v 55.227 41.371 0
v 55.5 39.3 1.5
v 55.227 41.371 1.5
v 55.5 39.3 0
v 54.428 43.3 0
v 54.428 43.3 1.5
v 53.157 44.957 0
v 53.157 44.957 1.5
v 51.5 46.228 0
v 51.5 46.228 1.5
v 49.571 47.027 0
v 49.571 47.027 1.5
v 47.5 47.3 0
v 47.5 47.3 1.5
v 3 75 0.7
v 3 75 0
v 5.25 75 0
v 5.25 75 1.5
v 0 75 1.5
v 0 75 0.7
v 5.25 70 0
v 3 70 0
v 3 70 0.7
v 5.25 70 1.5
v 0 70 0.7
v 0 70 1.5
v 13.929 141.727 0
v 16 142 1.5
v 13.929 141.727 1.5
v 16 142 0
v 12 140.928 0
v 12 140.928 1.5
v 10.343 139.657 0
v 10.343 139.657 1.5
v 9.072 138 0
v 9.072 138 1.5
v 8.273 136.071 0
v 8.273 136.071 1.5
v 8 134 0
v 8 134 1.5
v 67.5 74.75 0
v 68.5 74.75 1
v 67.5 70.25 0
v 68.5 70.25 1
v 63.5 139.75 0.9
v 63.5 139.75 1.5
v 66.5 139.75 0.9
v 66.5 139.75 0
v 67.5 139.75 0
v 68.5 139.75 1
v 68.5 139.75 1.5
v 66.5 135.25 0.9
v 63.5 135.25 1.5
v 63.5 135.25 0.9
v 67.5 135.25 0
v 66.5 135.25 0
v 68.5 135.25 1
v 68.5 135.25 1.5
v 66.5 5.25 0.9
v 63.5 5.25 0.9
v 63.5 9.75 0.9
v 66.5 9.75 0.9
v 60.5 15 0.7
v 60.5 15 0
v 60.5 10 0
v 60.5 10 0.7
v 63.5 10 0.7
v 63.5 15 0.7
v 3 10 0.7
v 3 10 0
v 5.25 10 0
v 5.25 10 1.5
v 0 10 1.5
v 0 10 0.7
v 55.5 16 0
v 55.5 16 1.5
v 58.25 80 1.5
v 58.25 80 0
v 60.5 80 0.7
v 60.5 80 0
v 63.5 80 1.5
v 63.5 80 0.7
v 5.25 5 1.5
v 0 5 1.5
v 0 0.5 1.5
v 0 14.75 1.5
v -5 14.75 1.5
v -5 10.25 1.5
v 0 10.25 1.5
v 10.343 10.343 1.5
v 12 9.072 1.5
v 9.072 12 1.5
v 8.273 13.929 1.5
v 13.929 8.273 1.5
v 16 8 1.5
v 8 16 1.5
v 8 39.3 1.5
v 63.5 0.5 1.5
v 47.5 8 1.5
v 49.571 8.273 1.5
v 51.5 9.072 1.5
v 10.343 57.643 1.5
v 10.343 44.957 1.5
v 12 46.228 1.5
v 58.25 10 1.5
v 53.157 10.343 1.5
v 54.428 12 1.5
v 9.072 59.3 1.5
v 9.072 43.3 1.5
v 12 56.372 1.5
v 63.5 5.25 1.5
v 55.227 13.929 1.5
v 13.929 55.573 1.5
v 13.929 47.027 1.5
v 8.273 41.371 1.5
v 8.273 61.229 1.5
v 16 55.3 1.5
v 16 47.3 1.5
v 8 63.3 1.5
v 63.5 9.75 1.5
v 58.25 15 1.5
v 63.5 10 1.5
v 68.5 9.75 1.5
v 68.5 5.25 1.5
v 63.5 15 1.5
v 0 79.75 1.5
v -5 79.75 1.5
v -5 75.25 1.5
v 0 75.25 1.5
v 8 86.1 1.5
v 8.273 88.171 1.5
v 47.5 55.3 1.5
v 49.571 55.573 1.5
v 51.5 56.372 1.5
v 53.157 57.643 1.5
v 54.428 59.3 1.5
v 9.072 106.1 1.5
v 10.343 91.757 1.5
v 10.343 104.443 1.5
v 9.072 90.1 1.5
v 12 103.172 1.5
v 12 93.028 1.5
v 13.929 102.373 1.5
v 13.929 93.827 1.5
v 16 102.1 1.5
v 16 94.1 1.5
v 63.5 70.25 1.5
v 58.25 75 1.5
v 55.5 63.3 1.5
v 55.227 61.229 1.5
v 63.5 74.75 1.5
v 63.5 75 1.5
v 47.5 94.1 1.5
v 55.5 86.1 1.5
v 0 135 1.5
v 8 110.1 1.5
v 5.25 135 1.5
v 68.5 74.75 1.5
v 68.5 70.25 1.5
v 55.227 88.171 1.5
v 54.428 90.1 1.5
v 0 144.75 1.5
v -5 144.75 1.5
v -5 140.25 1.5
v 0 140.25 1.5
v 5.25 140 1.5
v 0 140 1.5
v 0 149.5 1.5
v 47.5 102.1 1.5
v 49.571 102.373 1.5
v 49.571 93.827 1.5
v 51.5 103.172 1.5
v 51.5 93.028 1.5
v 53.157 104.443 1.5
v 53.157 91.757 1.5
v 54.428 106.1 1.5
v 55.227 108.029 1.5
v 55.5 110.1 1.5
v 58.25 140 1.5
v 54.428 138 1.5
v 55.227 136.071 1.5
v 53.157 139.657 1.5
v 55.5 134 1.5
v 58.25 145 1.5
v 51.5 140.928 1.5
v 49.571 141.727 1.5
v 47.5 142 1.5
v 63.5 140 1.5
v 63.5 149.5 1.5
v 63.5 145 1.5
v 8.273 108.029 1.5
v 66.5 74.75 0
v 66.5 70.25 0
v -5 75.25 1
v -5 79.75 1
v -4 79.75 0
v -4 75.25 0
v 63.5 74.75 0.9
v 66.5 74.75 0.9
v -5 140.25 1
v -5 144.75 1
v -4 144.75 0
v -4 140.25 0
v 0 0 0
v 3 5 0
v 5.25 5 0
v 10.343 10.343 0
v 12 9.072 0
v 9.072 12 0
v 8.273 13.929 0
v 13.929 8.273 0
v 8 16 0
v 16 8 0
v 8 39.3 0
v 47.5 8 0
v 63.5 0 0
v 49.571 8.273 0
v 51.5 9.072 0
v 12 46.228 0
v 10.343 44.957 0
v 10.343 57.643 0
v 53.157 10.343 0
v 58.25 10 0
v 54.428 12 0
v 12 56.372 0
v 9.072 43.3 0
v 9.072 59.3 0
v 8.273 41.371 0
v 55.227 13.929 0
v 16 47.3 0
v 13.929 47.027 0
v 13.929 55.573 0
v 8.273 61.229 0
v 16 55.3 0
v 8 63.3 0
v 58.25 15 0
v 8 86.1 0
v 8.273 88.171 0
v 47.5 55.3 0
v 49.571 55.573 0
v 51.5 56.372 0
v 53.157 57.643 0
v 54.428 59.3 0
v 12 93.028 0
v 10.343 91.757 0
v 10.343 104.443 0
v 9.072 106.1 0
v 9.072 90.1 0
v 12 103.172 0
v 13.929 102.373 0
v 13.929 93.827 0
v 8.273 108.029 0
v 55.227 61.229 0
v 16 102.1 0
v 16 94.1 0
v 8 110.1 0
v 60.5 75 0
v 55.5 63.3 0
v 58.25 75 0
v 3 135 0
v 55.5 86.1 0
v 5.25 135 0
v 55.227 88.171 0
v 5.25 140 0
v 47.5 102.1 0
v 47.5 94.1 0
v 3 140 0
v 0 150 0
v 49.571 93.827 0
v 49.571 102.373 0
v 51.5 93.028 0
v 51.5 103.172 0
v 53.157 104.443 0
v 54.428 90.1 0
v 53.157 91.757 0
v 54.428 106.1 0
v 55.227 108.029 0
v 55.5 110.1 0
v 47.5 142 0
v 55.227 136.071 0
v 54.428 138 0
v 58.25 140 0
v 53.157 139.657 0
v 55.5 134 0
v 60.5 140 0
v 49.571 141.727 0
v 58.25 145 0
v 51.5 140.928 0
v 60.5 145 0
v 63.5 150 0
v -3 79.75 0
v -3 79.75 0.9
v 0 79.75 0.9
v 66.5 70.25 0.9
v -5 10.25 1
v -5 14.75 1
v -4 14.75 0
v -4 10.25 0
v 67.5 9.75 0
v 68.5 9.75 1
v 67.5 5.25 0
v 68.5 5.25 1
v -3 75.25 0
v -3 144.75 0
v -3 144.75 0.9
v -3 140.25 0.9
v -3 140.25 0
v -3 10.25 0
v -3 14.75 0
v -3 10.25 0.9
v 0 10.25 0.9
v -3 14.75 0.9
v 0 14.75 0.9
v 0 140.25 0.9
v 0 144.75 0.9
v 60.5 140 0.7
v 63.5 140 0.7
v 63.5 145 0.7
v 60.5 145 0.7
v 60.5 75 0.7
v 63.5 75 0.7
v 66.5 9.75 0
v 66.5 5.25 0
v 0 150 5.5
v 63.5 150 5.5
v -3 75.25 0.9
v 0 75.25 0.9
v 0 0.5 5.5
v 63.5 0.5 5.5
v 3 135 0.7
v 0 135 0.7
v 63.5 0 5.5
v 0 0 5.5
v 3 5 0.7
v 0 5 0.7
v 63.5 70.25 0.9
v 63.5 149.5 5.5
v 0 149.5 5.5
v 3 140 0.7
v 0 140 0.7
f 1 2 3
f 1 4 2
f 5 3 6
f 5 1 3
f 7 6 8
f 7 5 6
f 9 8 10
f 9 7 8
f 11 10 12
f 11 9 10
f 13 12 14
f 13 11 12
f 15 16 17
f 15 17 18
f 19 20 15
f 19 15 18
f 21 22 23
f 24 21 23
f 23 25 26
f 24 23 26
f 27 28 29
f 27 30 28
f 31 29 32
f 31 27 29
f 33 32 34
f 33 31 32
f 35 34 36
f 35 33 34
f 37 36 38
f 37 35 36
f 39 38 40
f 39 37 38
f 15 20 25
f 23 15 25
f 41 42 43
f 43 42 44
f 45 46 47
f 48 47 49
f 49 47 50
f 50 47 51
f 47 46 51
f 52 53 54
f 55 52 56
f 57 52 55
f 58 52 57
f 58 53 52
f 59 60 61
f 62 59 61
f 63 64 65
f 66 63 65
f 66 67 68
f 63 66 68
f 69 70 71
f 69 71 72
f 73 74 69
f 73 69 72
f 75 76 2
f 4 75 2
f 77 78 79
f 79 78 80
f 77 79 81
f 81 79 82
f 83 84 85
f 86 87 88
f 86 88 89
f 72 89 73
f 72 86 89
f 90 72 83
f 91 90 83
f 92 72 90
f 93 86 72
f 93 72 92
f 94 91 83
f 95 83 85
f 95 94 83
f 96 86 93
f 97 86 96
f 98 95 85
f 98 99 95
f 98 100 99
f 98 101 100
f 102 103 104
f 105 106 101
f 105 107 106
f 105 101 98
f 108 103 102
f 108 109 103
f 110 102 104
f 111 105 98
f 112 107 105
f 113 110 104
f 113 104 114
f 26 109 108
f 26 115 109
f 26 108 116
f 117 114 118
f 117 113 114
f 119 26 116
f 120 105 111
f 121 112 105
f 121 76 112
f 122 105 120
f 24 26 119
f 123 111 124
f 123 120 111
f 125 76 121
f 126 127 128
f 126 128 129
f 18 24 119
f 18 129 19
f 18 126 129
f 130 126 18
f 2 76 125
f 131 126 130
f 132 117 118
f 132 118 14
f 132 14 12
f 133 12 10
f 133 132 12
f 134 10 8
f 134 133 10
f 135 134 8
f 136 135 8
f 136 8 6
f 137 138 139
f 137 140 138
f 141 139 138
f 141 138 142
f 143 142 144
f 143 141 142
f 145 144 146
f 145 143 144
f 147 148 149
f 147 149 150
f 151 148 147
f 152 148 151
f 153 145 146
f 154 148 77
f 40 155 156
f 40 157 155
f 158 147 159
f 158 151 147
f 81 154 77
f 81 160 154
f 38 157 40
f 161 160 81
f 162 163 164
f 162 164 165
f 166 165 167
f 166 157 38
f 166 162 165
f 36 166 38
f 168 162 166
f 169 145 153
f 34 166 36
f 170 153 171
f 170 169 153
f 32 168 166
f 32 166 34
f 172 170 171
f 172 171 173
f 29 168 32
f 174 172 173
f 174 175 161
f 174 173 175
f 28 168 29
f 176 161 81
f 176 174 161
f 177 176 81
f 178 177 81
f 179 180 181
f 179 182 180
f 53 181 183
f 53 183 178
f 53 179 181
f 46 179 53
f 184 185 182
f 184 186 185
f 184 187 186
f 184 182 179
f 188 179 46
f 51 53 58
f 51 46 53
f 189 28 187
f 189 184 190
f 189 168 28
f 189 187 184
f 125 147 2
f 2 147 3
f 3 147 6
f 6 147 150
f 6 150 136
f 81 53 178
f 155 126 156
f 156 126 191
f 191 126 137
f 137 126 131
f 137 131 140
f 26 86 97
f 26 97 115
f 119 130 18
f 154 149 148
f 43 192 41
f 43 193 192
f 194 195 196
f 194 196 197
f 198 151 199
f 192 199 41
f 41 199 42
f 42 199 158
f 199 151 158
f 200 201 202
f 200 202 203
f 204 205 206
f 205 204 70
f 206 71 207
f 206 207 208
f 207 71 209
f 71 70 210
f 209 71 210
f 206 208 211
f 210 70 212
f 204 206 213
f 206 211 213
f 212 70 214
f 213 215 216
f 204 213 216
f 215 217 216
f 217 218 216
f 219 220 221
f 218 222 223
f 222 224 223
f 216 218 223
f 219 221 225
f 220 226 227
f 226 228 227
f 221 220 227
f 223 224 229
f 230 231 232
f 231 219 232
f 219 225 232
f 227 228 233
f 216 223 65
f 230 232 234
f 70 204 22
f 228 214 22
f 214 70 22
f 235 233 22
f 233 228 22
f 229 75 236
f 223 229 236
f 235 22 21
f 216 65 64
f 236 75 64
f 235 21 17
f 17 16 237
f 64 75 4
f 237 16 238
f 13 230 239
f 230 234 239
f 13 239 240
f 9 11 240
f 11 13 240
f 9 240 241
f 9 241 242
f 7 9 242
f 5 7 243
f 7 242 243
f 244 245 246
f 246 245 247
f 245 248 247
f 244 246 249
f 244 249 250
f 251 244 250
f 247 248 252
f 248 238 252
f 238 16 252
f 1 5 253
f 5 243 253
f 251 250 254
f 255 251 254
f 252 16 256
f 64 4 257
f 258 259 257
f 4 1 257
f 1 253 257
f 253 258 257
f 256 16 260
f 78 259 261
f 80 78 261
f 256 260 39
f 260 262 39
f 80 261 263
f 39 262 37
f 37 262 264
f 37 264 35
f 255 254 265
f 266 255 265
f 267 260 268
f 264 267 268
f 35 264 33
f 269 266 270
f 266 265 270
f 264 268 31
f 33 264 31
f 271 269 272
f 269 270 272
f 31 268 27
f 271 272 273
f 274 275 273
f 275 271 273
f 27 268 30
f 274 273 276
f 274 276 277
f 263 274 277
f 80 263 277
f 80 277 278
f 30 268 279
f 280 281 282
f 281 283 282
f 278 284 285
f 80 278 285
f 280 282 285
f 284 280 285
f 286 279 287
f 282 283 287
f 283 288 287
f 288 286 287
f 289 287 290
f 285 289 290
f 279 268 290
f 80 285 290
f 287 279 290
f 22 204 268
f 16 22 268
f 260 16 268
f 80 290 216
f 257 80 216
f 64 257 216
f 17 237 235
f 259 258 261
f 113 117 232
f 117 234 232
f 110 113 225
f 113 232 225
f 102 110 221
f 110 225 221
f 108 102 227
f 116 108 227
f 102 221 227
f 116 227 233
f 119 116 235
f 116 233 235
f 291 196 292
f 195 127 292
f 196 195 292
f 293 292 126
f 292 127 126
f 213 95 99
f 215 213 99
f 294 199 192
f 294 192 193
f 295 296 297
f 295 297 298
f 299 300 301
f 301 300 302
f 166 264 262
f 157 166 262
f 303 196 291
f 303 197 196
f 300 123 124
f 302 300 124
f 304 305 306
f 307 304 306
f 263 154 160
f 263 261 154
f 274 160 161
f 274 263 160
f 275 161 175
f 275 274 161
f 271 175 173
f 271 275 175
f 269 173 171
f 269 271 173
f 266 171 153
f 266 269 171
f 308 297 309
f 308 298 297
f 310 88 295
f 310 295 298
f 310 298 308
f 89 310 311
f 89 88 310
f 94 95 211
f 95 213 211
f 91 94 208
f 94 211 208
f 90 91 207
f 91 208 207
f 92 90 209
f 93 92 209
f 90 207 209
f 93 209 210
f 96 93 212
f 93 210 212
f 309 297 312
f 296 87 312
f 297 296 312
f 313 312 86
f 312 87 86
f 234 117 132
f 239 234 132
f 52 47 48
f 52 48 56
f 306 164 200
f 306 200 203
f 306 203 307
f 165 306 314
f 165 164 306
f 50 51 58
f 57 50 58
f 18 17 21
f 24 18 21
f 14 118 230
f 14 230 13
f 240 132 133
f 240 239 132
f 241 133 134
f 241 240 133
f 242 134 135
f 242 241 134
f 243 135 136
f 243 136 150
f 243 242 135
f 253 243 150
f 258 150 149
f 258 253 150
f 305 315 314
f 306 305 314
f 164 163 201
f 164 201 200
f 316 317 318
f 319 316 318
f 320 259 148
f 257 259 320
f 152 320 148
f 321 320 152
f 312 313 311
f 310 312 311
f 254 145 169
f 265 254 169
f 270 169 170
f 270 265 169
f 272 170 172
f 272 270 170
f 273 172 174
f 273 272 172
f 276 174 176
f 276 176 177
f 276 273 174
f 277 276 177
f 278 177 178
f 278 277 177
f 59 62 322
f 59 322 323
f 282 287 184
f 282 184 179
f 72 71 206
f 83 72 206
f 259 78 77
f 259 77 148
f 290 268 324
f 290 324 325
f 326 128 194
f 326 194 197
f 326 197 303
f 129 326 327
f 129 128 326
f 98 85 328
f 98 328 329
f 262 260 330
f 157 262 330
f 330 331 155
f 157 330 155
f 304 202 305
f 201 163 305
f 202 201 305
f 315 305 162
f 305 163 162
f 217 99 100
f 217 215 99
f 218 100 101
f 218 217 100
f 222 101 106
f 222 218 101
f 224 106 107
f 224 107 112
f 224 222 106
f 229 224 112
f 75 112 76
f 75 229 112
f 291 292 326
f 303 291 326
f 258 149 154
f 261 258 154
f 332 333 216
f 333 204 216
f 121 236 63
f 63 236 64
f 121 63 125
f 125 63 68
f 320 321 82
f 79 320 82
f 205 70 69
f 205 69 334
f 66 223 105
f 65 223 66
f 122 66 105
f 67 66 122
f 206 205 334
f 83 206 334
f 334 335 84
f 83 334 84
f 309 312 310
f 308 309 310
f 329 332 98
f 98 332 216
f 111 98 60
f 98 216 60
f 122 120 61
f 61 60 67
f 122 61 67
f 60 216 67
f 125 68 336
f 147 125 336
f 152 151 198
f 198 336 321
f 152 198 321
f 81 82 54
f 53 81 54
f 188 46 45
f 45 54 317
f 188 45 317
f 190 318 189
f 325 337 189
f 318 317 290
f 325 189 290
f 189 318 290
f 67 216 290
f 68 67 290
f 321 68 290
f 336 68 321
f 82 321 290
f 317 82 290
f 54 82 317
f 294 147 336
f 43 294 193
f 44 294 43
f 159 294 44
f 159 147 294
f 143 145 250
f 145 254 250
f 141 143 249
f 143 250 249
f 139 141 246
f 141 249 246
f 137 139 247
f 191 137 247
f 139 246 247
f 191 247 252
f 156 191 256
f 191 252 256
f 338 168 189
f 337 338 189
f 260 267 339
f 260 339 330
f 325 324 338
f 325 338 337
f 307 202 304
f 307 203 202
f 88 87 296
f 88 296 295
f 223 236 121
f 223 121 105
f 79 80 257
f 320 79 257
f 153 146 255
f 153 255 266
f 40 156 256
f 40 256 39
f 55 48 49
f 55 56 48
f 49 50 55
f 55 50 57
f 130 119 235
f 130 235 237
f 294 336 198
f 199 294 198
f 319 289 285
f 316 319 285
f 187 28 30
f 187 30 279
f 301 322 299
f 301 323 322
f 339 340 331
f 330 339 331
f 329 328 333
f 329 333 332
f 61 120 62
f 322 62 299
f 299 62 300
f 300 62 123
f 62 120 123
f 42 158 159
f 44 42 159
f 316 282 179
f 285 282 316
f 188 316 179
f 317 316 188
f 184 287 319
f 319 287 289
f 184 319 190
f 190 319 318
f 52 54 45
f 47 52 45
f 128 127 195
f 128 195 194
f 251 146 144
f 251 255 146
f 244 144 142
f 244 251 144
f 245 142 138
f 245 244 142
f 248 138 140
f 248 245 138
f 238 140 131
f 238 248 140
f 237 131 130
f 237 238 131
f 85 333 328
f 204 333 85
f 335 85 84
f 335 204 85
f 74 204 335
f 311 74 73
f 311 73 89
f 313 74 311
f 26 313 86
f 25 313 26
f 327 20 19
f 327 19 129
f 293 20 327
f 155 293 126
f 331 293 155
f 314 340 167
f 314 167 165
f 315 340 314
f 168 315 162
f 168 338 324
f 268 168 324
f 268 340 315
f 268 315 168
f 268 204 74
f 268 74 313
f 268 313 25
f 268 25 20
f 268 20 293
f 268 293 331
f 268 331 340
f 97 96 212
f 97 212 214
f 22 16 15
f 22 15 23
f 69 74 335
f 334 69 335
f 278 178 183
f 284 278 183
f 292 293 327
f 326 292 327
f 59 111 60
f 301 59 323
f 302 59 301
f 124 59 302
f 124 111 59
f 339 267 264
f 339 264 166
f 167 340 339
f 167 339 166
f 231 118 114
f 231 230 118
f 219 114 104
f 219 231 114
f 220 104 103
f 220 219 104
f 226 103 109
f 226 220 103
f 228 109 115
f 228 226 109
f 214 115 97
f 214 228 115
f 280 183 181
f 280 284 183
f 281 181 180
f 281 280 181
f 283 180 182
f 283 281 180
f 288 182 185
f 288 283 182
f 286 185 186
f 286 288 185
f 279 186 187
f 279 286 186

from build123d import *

# Parameters (mm, degrees)
F0_W      = 63.5
F0_H      = 150
F1_DEPTH  = 1.5
F2_W      = 47.5
F2_H      = 39.9
F2_H_2    = 38.8
F2_H_3    = 39.3
F3_DEPTH  = 1.501
F4_R      = 8
F5_W      = 63.5
F5_H      = 0.5
F6_DEPTH  = 4
F7_W      = 5
F7_H      = 0.8
F8_DEPTH  = 5.25
F9_W      = 5
F9_H      = 0.8
F10_DEPTH = 5.25
F11_W     = 4.5
F11_H     = 0.6
F12_DEPTH = 5
F13_W     = 4.5
F13_H     = 0.6
F14_DEPTH = 5
F15_W     = 2.25
F15_H     = 5
F16_DEPTH = 5.501
F17_W     = 2
F17_H     = 4.5
F18_DEPTH = 0.9
F19_W     = 2
F19_H     = 4.5
F20_DEPTH = 0.9
F21_W     = 2
F21_H     = 4.5
F22_DEPTH = 0.9
F23_W     = 2
F23_H     = 4.5
F24_DEPTH = 0.9
F25_W     = 2
F25_H     = 4.5
F26_DEPTH = 0.9
F27_W     = 2
F27_H     = 4.5
F28_DEPTH = 0.9
F29_SIZE  = 1


with BuildPart() as f1:
    # F0 (on Top) → F1 (new body)
    with BuildSketch(Plane.XY):
        with Locations((31.75, 75)):
            Rectangle(F0_W, F0_H)
    extrude(amount=F1_DEPTH)

    # F2 (on face) → F3 (cut, through all)
    with BuildSketch(Plane.XY.offset(1.5)):
        with Locations((31.75, 122.05)):
            Rectangle(F2_W, F2_H)
        with Locations((31.75, 74.7)):
            Rectangle(F2_W, F2_H_2)
        with Locations((31.75, 27.65)):
            Rectangle(F2_W, F2_H_3)
    extrude(amount=-F3_DEPTH, mode=Mode.SUBTRACT)

    # F4
    f4_edges = [f1.edges().sort_by_distance(p)[0] for p in [
        (8, 142, 0.75),
        (8, 94.1, 0.75),
        (8, 47.3, 0.75),
        (8, 102.1, 0.75),
        (8, 55.3, 0.75),
        (8, 8, 0.75),
        (55.5, 102.1, 0.75),
        (55.5, 55.3, 0.75),
        (55.5, 8, 0.75),
        (55.5, 142, 0.75),
        (55.5, 94.1, 0.75),
        (55.5, 47.3, 0.75),
    ]]
    fillet(f4_edges, radius=F4_R)

    # F5 (on face) → F6 (join)
    with BuildSketch(Plane.XY.offset(1.5)):
        with Locations((31.75, 0.25)):
            Rectangle(F5_W, F5_H)
        with Locations((31.75, 149.75)):
            Rectangle(F5_W, F5_H)
    extrude(amount=F6_DEPTH)

    # F7 (on face) → F8 (cut)
    with BuildSketch(Plane.YZ.offset(63.5)):
        with Locations((142.5, 1.1)):
            Rectangle(F7_W, F7_H)
        with Locations((77.5, 1.1)):
            Rectangle(F7_W, F7_H)
        with Locations((12.5, 1.1)):
            Rectangle(F7_W, F7_H)
    extrude(amount=-F8_DEPTH, mode=Mode.SUBTRACT)

    # F9 (on face) → F10 (cut)
    with BuildSketch(Plane(origin=(0, 0, 0), x_dir=(0, -1, 0), z_dir=(-1, 0, 0))):
        with Locations((-7.5, 1.1)):
            Rectangle(F9_W, F9_H)
        with Locations((-72.5, 1.1)):
            Rectangle(F9_W, F9_H)
        with Locations((-137.5, 1.1)):
            Rectangle(F9_W, F9_H)
    extrude(amount=-F10_DEPTH, mode=Mode.SUBTRACT)

    # F11 (on face) → F12 (join)
    with BuildSketch(Plane(origin=(0, 0, 0), x_dir=(0, -1, 0), z_dir=(-1, 0, 0))):
        with Locations((-142.5, 1.2)):
            Rectangle(F11_W, F11_H)
        with Locations((-77.5, 1.2)):
            Rectangle(F11_W, F11_H)
        with Locations((-12.5, 1.2)):
            Rectangle(F11_W, F11_H)
    extrude(amount=F12_DEPTH)

    # F13 (on face) → F14 (join)
    with BuildSketch(Plane.YZ.offset(63.5)):
        with Locations((137.5, 1.2)):
            Rectangle(F13_W, F13_H)
        with Locations((72.5, 1.2)):
            Rectangle(F13_W, F13_H)
        with Locations((7.5, 1.2)):
            Rectangle(F13_W, F13_H)
    extrude(amount=F14_DEPTH)

    # F15 (on face) → F16 (cut, through all)
    with BuildSketch(Plane(origin=(0, 0, 0), x_dir=(1, 0, 0), z_dir=(0, 0, -1))):
        with Locations((59.375, -12.5)):
            Rectangle(F15_W, F15_H)
        with Locations((4.125, -7.5)):
            Rectangle(F15_W, F15_H)
        with Locations((59.375, -77.5)):
            Rectangle(F15_W, F15_H)
        with Locations((4.125, -72.5)):
            Rectangle(F15_W, F15_H)
        with Locations((59.375, -142.5)):
            Rectangle(F15_W, F15_H)
        with Locations((4.125, -137.5)):
            Rectangle(F15_W, F15_H)
    extrude(amount=-F16_DEPTH, mode=Mode.SUBTRACT)

    # F17 (on face) → F18 (join)
    with BuildSketch(Plane(origin=(0, 0, 0.9), x_dir=(1, 0, 0), z_dir=(0, 0, -1))):
        with Locations((-4, -12.5)):
            Rectangle(F17_W, F17_H)
    extrude(amount=F18_DEPTH)

    # F19 (on face) → F20 (join)
    with BuildSketch(Plane(origin=(0, 0, 0.9), x_dir=(1, 0, 0), z_dir=(0, 0, -1))):
        with Locations((-4, -77.5)):
            Rectangle(F19_W, F19_H)
    extrude(amount=F20_DEPTH)

    # F21 (on face) → F22 (join)
    with BuildSketch(Plane(origin=(0, 0, 0.9), x_dir=(1, 0, 0), z_dir=(0, 0, -1))):
        with Locations((-4, -142.5)):
            Rectangle(F21_W, F21_H)
    extrude(amount=F22_DEPTH)

    # F23 (on face) → F24 (join)
    with BuildSketch(Plane(origin=(0, 0, 0.9), x_dir=(1, 0, 0), z_dir=(0, 0, -1))):
        with Locations((67.5, -137.5)):
            Rectangle(F23_W, F23_H)
    extrude(amount=F24_DEPTH)

    # F25 (on face) → F26 (join)
    with BuildSketch(Plane(origin=(0, 0, 0.9), x_dir=(1, 0, 0), z_dir=(0, 0, -1))):
        with Locations((67.5, -72.5)):
            Rectangle(F25_W, F25_H)
    extrude(amount=F26_DEPTH)

    # F27 (on face) → F28 (join)
    with BuildSketch(Plane(origin=(0, 0, 0.9), x_dir=(1, 0, 0), z_dir=(0, 0, -1))):
        with Locations((67.5, -7.5)):
            Rectangle(F27_W, F27_H)
    extrude(amount=F28_DEPTH)

    # F29
    f29_edges = [f1.edges().sort_by_distance(p)[0] for p in [
        (-5, 142.5, 0),
        (-5, 77.5, 0),
        (-5, 12.5, 0),
        (68.5, 72.5, 0),
        (68.5, 137.5, 0),
        (68.5, 7.5, 0),
    ]]
    chamfer(f29_edges, length=F29_SIZE)


solid = f1.part
